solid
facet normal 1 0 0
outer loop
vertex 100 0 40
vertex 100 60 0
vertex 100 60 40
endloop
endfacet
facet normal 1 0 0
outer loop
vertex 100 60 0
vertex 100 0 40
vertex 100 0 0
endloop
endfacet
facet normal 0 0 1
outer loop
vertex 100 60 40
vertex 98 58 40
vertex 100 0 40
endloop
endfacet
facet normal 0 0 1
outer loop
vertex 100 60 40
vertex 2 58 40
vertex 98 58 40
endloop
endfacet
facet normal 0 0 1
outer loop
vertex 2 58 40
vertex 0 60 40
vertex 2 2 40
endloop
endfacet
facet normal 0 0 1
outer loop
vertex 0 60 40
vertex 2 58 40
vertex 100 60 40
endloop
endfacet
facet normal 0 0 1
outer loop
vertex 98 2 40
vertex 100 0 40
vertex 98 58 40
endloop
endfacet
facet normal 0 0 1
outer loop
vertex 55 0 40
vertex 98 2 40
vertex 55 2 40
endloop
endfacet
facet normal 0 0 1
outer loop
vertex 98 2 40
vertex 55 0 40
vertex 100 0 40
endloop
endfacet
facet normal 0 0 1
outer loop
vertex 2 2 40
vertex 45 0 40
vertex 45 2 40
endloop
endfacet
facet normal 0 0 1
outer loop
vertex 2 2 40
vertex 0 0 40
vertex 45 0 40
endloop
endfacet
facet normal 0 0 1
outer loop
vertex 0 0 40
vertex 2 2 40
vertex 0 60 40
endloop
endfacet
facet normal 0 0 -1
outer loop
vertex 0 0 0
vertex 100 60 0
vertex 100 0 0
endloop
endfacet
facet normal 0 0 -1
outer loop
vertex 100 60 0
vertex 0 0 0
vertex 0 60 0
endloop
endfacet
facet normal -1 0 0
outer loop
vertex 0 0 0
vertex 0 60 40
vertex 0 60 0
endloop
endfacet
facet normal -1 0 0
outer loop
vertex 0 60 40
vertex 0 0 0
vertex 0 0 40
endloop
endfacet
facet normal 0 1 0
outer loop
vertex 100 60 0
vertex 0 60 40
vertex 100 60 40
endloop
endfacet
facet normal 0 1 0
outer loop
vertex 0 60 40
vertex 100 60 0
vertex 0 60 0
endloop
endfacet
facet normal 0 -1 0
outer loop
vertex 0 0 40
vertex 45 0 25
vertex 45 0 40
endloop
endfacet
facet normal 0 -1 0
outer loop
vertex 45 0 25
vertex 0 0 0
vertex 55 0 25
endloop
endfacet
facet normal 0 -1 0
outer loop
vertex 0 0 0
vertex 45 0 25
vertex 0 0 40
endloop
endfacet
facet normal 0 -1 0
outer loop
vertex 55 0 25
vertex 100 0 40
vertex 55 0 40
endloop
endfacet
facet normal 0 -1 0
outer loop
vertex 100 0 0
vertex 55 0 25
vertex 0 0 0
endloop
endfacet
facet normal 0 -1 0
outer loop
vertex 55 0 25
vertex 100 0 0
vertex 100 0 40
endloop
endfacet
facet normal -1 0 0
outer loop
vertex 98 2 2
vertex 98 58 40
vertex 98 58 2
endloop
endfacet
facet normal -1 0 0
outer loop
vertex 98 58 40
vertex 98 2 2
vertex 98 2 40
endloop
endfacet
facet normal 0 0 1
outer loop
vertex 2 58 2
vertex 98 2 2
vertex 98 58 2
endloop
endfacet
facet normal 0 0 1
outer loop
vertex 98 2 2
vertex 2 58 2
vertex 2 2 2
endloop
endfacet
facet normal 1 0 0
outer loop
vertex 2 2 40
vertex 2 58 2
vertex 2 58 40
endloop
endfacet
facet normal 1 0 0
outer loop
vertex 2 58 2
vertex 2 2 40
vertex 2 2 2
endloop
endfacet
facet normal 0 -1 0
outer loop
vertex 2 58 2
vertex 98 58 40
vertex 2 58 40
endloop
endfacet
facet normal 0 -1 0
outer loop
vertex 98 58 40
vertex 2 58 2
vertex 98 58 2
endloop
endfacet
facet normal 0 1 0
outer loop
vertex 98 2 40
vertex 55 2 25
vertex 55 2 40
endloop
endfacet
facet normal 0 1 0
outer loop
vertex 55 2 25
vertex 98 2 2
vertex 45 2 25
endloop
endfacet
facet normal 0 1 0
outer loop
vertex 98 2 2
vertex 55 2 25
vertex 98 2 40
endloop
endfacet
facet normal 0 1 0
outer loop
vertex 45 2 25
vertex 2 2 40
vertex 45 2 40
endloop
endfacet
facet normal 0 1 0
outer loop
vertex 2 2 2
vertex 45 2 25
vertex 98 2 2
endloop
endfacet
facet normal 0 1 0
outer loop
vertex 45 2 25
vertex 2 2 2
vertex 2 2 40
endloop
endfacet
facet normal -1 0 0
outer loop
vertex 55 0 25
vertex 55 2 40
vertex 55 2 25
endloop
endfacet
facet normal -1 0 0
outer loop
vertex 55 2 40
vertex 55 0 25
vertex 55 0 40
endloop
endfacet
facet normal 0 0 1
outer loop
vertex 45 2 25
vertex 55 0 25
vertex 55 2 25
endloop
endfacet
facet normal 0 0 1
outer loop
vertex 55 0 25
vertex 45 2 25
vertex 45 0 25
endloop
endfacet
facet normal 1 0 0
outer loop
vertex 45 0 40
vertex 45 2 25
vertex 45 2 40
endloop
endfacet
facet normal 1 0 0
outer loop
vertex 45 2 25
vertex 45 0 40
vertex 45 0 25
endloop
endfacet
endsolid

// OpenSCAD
$fn = 32;

// ----------------------------------------------------------------------
// Enclosure box: notch enclosure
// ----------------------------------------------------------------------

// --- parameters (mm) ---
box_l = 100;              // outer length, X
box_w = 60;               // outer width, Y
box_h = 40;               // outer height
wall_t = 2;               // wall thickness
notch_w = 10;             // cable notch width
notch_h = 15;             // cable notch height

inner_h = box_h - wall_t;  // cavity depth
boss_h = inner_h - 2;  // corner boss height

difference() {
  cube([box_l, box_w, box_h]);
  translate([wall_t, wall_t, wall_t])
    cube([box_l - 2 * wall_t, box_w - 2 * wall_t, box_h]);
  translate([box_l / 2 - notch_w / 2, -1, box_h - notch_h])
    cube([notch_w, wall_t + 2, notch_h + 1]);
}
